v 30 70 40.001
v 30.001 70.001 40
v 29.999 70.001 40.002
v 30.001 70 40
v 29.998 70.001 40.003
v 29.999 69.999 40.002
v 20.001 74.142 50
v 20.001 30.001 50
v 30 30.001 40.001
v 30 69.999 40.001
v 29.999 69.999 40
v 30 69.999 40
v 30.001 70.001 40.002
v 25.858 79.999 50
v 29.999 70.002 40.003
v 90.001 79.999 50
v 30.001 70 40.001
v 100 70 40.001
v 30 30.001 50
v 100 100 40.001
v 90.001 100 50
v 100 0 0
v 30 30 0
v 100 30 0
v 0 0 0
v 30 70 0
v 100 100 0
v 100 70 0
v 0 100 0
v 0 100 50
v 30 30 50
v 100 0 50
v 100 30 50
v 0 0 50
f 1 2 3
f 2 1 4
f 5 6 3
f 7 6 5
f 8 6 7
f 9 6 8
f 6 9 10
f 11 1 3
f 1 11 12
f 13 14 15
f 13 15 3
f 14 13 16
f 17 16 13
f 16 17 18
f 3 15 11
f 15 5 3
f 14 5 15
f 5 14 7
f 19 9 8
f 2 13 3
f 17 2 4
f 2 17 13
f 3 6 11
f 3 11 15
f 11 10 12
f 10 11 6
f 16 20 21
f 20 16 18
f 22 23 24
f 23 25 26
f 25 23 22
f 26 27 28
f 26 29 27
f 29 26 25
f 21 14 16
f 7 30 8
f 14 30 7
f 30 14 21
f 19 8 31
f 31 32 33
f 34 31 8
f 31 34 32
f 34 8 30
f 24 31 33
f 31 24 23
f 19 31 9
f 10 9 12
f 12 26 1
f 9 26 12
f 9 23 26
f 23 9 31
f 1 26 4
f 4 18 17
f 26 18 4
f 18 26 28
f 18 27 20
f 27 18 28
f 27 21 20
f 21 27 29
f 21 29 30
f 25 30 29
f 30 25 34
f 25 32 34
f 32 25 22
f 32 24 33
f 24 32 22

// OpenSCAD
//==============================================================================
//
//           prism-chamfer - the missing chamfer tool for OpenSCAD
//
// Author:  Heath Raftery
// Origin:  http://github.com/hraftery/prism-chamfer
// License: GPLv3, see LICENSE for terms.
//
// See the accompanying README for instructions on use.
//
//==============================================================================


include <prism-chamfer.scad>;

// Zero-based index of first edge in the polygon to be chamfered.
Start_edge=3;
// Zero-based index of last edge. Must be equal to or greater than Start_edge.
End_edge=5;
// If true, chamfer the edges at the top of the prism. Else, chamfer the bottom edges.
Top=true;
// Length of the sides of the chamfer, or just the top/bottom side if Enable_side2 is true.
Side_length=10;
// If true, allow the length of the sides of the chamfer to be set independantly.
Enable_side2=false;
// If Enable_side2 is true, length of the side parallel to the z-axis. Ignored otherwise.
Side2_length=15;
// Depth of the chamfer in any inner corners between start_edge and end_edge.
Corner_slope="medium"; // [shallow, medium, deep]

difference() {
  polygon_points = [[0,0],[100,0],[100,30],[30,30],[30,70],[100,70],[100,100],[0,100]];
  h=50;
  linear_extrude(height=h)
    polygon(polygon_points, convexity=2);

  prism_chamfer_mask(polygon_points, Start_edge, End_edge, Top?h:0,
                     Side_length, Enable_side2 ? Side2_length : Side_length, Corner_slope);
}
